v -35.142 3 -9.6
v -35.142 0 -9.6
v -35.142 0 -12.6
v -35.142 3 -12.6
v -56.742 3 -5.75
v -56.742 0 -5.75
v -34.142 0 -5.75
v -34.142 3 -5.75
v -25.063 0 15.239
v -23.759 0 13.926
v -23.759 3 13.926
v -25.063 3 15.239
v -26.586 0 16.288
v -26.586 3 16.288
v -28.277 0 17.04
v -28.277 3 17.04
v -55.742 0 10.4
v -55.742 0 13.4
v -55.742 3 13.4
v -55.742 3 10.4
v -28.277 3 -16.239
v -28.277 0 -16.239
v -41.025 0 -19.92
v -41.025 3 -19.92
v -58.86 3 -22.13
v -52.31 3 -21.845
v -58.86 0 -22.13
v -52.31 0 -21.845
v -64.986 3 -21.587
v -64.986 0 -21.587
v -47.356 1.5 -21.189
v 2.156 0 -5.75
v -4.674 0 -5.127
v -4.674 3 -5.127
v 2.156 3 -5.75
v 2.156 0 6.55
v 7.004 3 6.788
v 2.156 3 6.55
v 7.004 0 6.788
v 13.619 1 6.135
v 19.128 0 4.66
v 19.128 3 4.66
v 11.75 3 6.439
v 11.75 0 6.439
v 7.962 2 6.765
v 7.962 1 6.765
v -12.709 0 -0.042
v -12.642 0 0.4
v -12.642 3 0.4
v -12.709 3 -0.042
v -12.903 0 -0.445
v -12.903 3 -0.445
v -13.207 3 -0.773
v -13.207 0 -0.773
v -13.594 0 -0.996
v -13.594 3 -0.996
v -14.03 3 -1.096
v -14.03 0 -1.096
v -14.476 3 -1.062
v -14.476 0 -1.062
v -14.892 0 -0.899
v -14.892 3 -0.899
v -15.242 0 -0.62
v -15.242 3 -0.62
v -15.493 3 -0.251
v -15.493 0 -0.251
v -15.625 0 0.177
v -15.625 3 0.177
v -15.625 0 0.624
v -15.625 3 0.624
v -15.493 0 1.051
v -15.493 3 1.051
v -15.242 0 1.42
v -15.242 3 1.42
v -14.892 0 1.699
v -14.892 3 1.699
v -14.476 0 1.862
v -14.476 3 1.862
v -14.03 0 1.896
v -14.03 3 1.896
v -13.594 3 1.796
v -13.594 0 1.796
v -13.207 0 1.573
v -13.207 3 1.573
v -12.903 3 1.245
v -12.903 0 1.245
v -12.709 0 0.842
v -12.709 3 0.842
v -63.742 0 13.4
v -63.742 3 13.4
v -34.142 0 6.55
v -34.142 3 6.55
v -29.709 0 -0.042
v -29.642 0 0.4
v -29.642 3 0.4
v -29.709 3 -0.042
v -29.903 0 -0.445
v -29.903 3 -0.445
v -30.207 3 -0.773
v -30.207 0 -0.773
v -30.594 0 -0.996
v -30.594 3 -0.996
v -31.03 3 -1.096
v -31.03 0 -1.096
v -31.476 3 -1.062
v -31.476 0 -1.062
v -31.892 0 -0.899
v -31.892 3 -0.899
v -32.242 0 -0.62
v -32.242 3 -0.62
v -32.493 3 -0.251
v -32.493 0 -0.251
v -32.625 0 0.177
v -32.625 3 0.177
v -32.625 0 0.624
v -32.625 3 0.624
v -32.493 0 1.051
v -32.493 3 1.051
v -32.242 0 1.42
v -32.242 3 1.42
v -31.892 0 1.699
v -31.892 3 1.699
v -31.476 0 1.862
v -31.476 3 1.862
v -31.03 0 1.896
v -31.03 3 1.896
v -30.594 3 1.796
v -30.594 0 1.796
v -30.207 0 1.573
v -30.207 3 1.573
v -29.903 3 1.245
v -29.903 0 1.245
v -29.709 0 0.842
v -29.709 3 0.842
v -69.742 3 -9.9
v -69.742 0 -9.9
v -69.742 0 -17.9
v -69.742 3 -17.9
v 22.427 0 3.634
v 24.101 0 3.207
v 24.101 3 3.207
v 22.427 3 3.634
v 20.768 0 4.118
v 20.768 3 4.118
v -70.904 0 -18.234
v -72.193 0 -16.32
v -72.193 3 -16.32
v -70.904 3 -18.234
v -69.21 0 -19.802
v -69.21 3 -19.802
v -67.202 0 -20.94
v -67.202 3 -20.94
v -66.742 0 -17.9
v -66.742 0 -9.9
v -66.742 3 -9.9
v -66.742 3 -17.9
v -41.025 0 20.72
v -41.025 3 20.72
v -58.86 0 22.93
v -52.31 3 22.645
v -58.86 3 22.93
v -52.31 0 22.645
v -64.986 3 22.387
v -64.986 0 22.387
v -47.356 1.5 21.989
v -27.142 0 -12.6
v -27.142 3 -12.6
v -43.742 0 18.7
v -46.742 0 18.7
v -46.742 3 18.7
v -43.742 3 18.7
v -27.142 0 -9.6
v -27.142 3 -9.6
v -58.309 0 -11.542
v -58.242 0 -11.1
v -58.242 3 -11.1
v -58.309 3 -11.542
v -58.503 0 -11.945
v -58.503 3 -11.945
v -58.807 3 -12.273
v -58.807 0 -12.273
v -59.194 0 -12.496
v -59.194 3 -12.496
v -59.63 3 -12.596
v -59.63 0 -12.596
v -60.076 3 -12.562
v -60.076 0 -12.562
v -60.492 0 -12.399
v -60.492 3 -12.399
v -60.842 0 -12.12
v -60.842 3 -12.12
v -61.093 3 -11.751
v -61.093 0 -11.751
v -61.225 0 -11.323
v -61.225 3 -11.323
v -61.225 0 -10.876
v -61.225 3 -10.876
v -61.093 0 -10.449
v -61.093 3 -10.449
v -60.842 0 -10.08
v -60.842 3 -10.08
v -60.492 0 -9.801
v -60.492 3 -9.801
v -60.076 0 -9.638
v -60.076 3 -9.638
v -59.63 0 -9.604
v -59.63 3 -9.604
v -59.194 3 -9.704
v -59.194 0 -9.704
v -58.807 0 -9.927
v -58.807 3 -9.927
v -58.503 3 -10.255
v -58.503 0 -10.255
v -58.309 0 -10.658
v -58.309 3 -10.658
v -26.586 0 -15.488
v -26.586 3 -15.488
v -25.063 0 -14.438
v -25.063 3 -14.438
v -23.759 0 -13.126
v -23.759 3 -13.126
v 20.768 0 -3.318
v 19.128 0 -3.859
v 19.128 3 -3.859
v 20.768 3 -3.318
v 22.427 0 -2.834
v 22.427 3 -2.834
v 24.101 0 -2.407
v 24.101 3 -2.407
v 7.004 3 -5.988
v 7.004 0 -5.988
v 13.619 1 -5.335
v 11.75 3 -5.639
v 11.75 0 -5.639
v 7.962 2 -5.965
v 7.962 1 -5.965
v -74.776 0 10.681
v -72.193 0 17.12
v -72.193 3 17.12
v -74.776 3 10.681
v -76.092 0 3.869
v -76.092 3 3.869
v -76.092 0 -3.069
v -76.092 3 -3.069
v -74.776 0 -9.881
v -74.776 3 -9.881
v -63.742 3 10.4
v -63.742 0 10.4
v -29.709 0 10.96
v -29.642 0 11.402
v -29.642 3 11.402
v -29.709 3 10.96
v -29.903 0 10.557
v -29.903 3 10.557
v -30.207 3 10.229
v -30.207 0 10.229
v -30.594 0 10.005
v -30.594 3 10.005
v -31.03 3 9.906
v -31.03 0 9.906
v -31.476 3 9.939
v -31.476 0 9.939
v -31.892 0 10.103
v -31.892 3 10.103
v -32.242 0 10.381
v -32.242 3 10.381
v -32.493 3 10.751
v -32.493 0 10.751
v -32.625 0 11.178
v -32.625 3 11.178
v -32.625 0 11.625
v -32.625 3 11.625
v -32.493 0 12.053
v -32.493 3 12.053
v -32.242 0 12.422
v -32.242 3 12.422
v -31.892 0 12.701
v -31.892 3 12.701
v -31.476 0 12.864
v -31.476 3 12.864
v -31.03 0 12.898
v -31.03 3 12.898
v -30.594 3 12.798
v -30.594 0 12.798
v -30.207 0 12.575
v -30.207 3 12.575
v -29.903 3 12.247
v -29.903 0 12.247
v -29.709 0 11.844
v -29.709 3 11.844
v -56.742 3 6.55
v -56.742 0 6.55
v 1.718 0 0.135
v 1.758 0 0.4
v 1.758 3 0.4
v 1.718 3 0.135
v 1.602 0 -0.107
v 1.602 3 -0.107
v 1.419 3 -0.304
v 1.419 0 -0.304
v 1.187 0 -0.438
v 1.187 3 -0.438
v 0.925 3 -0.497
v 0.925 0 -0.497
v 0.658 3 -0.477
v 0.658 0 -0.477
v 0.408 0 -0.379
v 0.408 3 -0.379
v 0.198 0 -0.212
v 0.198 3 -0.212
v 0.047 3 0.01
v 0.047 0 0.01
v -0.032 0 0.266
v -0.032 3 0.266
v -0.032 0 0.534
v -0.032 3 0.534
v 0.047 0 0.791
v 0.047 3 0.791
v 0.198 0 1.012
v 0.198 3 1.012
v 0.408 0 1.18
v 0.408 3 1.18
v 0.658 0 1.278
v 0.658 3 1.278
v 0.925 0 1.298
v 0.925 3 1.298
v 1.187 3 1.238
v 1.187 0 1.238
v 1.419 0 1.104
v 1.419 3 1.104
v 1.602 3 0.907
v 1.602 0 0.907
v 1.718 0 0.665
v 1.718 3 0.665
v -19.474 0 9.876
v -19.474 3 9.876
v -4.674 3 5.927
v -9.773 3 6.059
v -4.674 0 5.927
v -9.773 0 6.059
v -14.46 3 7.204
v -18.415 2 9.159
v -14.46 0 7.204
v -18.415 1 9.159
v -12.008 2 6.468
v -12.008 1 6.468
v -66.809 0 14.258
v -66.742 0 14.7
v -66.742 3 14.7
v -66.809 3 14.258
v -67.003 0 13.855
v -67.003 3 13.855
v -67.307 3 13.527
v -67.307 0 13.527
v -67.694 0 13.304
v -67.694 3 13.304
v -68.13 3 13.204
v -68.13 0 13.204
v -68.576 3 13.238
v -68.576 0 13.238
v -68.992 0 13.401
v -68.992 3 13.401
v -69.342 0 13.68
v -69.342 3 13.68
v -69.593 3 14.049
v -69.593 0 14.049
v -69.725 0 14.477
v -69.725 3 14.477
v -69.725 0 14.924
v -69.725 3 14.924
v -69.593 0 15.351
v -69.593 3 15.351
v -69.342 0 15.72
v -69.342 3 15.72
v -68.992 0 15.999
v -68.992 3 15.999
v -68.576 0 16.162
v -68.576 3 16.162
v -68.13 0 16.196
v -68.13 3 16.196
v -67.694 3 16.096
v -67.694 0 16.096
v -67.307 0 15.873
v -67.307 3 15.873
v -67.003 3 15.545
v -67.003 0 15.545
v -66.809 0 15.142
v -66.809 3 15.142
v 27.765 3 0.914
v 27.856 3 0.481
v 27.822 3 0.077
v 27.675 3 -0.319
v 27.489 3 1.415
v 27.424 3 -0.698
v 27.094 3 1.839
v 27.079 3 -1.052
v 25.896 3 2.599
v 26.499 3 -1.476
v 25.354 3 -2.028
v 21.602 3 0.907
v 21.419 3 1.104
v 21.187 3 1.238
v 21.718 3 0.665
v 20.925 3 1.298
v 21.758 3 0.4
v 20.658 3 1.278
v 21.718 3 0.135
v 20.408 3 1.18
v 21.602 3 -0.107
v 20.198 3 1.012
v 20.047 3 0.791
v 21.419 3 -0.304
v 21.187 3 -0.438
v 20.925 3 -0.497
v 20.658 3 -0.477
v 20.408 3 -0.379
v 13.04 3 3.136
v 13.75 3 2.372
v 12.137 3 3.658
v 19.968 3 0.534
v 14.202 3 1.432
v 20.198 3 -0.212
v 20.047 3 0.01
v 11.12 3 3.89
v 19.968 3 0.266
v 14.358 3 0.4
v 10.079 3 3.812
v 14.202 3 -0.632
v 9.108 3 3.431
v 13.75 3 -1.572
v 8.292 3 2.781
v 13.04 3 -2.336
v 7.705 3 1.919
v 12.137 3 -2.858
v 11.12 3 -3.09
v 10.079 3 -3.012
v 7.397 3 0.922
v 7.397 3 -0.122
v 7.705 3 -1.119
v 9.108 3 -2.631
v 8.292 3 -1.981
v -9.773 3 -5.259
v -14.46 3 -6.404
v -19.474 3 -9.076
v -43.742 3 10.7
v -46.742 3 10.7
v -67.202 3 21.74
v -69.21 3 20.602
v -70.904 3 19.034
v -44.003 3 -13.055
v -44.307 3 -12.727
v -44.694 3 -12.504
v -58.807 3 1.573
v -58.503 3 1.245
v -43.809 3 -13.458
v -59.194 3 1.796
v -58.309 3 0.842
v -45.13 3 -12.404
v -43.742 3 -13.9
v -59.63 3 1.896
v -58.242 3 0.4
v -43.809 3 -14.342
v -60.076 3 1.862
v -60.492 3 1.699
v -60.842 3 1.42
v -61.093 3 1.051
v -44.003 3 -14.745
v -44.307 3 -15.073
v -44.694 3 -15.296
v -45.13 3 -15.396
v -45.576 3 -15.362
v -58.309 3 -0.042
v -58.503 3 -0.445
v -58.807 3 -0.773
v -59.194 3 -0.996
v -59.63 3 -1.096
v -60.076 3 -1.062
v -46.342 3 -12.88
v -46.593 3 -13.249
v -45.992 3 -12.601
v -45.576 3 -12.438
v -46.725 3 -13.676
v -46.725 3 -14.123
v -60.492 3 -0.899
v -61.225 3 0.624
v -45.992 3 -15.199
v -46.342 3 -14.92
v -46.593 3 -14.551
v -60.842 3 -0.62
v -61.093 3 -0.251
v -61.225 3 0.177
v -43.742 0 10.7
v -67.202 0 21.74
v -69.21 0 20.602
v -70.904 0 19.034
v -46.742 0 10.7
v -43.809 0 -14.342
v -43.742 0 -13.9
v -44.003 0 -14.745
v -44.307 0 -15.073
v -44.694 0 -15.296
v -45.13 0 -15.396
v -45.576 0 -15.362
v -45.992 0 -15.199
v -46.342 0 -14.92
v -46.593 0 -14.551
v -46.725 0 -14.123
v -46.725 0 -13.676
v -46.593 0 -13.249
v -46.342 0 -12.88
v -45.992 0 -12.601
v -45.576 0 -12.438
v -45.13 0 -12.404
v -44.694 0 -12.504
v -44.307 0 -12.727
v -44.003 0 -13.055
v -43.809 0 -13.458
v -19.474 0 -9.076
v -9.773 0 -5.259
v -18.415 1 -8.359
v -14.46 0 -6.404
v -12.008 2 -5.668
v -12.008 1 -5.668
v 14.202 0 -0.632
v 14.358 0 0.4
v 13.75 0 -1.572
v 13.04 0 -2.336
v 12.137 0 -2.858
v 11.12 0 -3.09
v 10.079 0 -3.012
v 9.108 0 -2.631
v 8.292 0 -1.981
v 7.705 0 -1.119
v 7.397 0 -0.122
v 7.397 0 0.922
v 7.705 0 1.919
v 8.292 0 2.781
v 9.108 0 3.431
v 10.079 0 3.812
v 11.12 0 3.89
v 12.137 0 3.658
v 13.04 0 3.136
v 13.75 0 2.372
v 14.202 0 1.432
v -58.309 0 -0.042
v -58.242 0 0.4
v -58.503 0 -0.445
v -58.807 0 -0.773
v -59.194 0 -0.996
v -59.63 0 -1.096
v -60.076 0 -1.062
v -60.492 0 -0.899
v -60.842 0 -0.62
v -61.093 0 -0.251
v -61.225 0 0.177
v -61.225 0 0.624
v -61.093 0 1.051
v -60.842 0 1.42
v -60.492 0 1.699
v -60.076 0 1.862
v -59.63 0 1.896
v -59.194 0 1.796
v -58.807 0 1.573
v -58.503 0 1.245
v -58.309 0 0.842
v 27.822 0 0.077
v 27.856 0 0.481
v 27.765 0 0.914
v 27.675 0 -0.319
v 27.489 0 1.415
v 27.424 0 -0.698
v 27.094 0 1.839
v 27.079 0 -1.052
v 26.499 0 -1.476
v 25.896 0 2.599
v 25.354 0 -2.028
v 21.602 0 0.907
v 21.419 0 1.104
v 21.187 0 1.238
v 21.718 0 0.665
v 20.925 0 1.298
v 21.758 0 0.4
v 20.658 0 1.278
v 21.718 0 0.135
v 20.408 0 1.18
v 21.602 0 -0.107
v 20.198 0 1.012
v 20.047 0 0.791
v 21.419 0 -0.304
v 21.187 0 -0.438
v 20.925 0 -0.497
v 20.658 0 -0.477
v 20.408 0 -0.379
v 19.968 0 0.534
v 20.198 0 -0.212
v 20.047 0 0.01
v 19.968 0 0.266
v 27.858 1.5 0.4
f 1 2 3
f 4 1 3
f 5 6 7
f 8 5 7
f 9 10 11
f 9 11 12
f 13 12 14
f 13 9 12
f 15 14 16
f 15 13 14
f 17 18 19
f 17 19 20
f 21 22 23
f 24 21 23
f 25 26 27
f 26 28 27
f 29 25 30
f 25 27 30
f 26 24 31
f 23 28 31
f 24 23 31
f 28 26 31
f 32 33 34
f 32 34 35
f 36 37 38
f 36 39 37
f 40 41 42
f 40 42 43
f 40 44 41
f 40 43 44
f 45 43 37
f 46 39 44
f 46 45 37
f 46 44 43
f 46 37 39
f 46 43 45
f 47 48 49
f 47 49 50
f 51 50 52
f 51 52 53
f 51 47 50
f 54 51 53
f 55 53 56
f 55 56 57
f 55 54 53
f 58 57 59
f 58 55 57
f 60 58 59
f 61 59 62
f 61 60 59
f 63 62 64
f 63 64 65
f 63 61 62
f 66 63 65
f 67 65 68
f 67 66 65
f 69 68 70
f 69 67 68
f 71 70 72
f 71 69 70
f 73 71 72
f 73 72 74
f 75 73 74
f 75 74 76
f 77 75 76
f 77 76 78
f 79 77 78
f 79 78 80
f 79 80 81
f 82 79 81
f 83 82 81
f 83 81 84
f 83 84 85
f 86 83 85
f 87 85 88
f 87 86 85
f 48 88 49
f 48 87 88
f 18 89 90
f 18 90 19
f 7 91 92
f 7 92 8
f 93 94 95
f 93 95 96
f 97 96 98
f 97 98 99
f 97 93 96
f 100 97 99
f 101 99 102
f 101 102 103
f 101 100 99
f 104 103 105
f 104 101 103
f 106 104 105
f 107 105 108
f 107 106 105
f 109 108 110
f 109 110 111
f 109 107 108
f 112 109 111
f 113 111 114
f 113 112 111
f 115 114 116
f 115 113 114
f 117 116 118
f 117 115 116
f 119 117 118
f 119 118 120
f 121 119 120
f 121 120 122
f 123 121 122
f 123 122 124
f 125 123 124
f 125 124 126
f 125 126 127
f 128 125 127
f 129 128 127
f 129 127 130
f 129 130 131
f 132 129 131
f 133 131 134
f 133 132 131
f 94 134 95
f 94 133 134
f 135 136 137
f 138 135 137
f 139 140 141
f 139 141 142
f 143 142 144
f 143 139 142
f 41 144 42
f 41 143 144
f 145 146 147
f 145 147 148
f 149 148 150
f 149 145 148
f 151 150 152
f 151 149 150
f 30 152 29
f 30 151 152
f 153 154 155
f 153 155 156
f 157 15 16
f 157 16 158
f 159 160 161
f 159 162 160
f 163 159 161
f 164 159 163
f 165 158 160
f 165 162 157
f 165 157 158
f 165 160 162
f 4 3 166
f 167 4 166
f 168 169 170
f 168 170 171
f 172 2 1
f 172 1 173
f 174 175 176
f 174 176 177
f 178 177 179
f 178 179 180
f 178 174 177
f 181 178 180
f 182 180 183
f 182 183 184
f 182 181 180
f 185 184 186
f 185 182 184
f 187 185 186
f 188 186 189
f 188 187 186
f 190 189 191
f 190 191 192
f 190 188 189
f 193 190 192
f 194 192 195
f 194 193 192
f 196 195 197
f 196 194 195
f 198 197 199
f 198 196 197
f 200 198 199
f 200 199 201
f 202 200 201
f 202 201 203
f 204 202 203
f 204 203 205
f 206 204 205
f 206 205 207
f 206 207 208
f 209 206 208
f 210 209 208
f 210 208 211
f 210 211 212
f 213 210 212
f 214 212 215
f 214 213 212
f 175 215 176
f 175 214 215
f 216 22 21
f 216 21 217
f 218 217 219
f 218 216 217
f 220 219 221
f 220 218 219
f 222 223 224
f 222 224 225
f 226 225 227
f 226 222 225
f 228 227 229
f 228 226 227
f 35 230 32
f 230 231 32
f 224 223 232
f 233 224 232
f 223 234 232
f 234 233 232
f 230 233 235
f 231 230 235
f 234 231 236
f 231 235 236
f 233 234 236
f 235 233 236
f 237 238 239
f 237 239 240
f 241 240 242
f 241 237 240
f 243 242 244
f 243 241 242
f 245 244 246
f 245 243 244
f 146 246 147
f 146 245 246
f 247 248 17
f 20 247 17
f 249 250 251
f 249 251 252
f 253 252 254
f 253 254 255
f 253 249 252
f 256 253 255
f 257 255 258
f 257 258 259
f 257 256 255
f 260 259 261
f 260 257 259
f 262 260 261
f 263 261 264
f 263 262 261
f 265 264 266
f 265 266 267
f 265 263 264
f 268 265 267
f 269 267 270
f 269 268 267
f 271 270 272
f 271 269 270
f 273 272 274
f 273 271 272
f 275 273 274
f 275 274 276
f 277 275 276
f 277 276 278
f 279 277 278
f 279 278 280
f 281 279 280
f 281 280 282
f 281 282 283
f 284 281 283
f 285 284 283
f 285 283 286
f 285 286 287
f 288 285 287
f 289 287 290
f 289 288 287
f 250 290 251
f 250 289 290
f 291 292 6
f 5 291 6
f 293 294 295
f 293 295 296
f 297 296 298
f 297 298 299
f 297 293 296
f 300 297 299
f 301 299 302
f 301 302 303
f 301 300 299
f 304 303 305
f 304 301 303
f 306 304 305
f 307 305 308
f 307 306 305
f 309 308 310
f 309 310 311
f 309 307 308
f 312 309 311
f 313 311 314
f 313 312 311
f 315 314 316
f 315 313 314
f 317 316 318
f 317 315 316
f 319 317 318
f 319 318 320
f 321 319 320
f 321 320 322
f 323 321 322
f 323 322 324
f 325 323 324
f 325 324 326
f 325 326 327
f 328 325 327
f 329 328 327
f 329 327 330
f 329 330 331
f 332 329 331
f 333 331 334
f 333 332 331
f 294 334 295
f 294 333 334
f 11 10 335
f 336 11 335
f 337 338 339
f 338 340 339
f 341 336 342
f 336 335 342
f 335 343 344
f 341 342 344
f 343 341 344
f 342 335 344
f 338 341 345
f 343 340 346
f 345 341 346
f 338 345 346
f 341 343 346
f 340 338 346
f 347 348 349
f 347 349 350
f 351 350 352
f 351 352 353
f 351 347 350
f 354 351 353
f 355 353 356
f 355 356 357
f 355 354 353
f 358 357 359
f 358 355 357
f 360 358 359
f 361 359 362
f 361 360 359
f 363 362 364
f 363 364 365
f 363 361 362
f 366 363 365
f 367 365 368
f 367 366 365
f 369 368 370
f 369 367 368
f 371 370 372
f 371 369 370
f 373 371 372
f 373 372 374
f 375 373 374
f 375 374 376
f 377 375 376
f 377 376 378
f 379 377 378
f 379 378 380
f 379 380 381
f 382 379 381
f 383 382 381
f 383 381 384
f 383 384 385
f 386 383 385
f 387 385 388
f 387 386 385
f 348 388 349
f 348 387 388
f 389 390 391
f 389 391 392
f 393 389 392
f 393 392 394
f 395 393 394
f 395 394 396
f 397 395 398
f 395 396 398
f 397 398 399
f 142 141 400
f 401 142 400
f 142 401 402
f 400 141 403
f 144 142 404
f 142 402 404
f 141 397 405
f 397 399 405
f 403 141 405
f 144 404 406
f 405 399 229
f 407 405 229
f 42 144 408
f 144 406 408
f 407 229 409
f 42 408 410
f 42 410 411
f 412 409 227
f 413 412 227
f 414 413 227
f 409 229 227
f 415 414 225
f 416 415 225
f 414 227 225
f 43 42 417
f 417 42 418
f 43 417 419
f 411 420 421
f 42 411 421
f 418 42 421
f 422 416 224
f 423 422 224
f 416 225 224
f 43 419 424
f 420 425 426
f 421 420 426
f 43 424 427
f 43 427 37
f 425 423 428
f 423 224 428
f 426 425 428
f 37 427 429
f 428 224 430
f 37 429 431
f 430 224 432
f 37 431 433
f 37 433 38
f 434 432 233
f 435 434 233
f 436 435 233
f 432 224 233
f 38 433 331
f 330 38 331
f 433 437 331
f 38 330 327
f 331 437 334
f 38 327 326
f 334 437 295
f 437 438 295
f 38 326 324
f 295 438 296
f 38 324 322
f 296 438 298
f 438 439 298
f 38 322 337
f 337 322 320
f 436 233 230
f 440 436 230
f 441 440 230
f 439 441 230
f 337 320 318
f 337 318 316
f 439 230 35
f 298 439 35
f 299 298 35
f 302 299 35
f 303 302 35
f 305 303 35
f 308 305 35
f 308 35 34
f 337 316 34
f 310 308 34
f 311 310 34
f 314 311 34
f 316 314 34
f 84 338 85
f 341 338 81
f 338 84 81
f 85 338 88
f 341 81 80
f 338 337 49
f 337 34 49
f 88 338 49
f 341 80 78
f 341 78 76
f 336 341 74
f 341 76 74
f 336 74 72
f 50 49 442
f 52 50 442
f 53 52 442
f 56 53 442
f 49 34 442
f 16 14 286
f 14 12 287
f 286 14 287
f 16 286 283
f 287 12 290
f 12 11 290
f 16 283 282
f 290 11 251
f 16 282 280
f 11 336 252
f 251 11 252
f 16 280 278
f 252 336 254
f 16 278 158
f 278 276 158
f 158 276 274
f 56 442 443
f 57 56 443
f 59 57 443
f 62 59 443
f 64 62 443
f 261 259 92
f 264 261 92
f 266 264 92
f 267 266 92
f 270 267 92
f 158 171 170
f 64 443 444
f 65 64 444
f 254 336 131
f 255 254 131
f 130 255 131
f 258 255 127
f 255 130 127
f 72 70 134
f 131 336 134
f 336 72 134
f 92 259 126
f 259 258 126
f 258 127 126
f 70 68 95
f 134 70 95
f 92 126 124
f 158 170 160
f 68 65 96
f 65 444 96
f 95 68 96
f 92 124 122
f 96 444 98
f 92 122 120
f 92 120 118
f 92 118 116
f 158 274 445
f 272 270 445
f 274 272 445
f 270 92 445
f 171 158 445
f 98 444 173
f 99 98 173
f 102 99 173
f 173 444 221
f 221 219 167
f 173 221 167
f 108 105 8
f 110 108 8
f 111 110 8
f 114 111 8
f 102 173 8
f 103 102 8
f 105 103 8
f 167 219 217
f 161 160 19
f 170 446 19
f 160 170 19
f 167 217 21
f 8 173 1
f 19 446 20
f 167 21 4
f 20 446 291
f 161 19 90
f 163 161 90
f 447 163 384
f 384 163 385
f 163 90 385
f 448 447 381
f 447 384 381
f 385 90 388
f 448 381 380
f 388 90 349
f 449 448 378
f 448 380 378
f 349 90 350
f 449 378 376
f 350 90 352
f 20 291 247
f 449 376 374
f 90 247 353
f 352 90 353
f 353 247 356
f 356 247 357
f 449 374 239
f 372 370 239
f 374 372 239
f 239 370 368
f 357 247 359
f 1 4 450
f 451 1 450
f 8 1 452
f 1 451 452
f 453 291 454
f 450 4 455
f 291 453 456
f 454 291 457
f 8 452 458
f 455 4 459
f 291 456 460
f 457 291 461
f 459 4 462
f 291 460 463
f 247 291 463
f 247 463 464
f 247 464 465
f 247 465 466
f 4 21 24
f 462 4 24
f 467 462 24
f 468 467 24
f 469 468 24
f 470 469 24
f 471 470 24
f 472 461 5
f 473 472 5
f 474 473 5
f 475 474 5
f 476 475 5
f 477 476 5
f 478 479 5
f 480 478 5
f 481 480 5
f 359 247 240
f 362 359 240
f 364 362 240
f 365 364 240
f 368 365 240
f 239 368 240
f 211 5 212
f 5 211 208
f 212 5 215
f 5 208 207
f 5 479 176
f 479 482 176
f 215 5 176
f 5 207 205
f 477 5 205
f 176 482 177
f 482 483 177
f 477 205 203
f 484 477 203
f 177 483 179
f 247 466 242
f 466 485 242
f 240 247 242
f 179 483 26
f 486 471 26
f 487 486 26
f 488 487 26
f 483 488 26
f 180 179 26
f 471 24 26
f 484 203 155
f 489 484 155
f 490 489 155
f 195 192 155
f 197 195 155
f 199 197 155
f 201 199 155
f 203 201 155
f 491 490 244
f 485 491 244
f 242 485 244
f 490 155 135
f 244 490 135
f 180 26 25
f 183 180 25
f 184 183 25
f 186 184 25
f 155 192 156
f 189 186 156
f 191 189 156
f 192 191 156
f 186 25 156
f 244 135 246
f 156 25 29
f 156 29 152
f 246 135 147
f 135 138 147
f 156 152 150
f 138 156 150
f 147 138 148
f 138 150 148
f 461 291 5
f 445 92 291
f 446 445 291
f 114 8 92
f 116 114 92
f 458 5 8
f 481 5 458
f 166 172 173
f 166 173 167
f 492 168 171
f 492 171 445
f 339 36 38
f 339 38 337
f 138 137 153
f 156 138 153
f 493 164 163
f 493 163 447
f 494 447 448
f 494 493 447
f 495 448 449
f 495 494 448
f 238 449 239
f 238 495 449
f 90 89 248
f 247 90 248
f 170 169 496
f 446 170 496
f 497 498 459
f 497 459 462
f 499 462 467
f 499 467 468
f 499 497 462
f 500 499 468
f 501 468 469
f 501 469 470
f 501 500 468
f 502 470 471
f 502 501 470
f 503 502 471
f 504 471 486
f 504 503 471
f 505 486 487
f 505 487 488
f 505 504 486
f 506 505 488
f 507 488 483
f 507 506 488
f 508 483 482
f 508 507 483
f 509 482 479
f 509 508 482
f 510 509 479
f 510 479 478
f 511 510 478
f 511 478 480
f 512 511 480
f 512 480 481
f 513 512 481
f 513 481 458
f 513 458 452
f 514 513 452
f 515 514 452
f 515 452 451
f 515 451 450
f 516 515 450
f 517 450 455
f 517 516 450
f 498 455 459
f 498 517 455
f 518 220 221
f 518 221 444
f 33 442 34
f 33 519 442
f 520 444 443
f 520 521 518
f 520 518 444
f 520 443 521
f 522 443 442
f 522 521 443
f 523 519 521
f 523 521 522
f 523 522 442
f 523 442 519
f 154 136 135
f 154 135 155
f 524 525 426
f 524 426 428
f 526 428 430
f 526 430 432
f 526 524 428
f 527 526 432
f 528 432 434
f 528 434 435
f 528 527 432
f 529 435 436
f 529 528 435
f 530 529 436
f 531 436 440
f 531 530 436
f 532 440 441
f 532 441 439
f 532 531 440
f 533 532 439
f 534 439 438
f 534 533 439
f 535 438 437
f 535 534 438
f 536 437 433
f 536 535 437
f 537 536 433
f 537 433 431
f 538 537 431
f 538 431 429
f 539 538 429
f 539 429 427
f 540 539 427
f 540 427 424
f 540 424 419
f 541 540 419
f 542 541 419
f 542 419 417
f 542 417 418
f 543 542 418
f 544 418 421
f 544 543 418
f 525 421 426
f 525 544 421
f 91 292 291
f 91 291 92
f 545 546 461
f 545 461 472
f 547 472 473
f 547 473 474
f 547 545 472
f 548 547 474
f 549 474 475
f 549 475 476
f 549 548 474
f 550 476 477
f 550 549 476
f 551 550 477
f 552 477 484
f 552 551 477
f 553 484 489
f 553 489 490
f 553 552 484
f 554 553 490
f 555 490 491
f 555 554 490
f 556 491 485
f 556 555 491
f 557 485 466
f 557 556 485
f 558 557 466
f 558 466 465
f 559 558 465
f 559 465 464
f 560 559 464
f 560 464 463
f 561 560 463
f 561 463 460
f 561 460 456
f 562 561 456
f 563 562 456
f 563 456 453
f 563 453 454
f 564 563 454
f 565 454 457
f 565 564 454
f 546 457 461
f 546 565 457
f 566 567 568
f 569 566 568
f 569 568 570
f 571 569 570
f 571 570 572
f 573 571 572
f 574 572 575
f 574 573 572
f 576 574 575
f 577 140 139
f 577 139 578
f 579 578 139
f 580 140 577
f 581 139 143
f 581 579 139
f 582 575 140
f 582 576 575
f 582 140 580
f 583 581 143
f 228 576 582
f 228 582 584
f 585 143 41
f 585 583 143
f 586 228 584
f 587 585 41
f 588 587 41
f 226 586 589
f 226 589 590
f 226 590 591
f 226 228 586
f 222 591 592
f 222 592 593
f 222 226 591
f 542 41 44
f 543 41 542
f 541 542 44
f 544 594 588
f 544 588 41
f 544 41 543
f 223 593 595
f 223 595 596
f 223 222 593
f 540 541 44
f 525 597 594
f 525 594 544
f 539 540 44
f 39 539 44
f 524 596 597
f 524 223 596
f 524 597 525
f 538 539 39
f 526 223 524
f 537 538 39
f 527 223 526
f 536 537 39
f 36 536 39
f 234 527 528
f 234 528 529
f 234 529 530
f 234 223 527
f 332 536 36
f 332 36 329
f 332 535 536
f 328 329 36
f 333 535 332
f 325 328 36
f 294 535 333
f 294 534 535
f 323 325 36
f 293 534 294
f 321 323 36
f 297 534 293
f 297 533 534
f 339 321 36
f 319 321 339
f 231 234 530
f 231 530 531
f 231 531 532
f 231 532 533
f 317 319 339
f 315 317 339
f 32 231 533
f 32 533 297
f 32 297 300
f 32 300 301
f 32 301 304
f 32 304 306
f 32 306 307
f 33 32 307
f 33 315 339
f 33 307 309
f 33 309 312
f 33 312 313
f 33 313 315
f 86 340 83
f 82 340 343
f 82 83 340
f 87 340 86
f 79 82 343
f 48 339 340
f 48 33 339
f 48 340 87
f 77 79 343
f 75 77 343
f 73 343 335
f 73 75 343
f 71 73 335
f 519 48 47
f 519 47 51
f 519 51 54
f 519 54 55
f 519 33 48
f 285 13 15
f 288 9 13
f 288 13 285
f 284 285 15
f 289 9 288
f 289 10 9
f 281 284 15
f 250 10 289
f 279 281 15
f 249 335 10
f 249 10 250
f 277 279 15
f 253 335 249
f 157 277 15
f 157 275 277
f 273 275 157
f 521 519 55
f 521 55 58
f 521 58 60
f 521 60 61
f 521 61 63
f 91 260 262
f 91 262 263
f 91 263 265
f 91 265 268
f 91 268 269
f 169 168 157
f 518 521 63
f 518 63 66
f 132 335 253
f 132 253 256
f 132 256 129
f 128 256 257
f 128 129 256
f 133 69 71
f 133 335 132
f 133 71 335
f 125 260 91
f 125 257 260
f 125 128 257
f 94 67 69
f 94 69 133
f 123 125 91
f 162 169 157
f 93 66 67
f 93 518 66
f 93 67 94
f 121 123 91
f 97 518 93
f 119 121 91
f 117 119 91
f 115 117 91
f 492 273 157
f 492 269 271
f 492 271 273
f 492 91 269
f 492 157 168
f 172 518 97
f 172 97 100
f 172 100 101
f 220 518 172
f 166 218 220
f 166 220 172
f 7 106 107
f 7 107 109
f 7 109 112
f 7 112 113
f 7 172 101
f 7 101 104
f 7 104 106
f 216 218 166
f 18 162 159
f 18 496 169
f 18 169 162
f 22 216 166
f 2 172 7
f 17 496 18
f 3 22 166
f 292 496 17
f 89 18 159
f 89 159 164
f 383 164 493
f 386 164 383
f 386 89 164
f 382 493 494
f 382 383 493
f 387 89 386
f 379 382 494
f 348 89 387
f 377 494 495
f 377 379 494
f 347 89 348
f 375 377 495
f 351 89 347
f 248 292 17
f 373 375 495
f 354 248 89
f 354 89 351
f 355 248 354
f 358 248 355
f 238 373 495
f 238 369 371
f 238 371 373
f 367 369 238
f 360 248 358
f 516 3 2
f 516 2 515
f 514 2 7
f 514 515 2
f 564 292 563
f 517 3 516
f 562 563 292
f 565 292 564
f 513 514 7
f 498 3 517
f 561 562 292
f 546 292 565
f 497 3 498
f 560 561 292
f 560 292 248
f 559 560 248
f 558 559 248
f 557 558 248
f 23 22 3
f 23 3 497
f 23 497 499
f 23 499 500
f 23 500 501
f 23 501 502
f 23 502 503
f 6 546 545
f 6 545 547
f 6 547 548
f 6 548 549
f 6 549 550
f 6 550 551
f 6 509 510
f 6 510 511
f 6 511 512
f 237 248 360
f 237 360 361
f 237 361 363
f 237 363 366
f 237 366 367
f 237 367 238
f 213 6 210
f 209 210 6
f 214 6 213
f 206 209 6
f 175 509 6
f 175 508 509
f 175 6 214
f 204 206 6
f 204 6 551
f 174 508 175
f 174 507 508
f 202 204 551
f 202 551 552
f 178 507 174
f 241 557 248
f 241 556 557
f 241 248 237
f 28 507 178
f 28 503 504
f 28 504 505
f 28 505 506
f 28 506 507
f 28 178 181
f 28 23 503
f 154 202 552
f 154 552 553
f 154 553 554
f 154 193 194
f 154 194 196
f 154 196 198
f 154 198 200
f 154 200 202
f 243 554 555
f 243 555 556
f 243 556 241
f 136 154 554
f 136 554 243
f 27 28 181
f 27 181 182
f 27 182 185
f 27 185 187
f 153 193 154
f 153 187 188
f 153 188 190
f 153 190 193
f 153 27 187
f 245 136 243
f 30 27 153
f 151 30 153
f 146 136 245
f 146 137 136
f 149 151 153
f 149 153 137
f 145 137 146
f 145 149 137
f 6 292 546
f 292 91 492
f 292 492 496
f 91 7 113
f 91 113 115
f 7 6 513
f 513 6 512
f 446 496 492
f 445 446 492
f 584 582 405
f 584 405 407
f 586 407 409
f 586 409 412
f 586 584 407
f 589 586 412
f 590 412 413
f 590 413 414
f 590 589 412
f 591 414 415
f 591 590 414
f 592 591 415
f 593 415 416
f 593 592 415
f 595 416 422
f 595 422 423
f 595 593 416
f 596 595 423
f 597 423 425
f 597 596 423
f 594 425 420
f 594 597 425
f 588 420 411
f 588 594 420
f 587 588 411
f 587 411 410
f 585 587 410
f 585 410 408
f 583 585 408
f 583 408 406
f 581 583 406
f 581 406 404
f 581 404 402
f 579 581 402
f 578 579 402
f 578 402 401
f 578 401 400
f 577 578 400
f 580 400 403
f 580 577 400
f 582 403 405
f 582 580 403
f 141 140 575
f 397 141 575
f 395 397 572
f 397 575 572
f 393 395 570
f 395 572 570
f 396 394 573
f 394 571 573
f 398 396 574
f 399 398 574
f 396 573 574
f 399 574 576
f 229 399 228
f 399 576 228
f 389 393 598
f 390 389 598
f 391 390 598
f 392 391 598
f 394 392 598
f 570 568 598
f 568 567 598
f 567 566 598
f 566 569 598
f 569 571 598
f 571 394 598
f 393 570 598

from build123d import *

# Parameters (mm, degrees)
ESBO_O1_R                = 1.5
ESBO_O1_R_2              = 3.5
ESBO_O1_R_3              = 0.9
ESBO_O1_W                = 22.6
ESBO_O1_H                = 12.3
ESBO_O1_W_2              = 3
ESBO_O1_H_2              = 8
ESBO_O1_W_3              = 8
ESBO_O1_H_3              = 3
RESSALTO_EXTRUS_O1_DEPTH = 3


with BuildPart() as part:
    # Esboço1 → Ressalto-extrusão1 (new body)
    with BuildSketch(Plane(origin=(0, 0, 0), x_dir=(1, 0, 0), z_dir=(0, 1, 0))):
        with BuildLine():
            Line((-4.674449837, 5.126823449), (2.15649844, 5.74992269))
            add(Edge.make_bspline(
                [(19.127700004, 3.859391667), (13.692888976, 5.757269931), (8.035822873, 6.387450044), (2.15649844, 5.74992269)],
                knots=[0.35388944, 0.35388944, 0.35388944, 0.35388944, 1, 1, 1, 1], degree=3))
            ThreePointArc((19.127700004, 3.859391667), (21.595587829, 3.06871935), (24.101127023, 2.406974398))
            add(Edge.make_bspline(
                [(24.101129521, -3.20712694), (35.966754752, -0.40007519), (24.101127023, 2.406974398)],
                knots=[5.194112275, 5.194112275, 5.194112275, 7.372258742, 7.372258742, 7.372258742], degree=2, weights=[1, 0.463306864, 1]))
            ThreePointArc((24.101129521, -3.20712694), (21.595589041, -3.868872862), (19.127700004, -4.659546287))
            add(Edge.make_bspline(
                [(19.127700004, -4.659546287), (13.692889505, -6.55742607), (8.035822337, -7.187603127), (2.15649844, -6.55007731)],
                knots=[0.35388944, 0.35388944, 0.35388944, 0.35388944, 1, 1, 1, 1], degree=3))
            Line((2.15649844, -6.55007731), (-4.674449837, -5.926978069))
            add(Edge.make_bspline(
                [(-23.759026807, -13.92609603), (-18.993134449, -8.145749128), (-12.424143506, -5.367564321), (-4.674449837, -5.926978069)],
                knots=[0.101821695, 0.101821695, 0.101821695, 0.101821695, 1, 1, 1, 1], degree=3))
            ThreePointArc((-23.759026807, -13.92609603), (-25.800414194, -15.798822034), (-28.277263571, -17.039621097))
            add(Edge.make_bspline(
                [(-28.277263571, -17.039621097), (-34.579205058, -19.166234), (-47.597806191, -22.747709276), (-59.650258973, -23.294853785), (-64.986052109, -22.387135922)],
                knots=[0.241589655, 0.241589655, 0.241589655, 0.241589655, 0.401358205, 0.561126756, 0.561126756, 0.561126756, 0.561126756], degree=3))
            ThreePointArc((-64.986052109, -22.387135922), (-69.209775007, -20.602207926), (-72.192804257, -17.119774932))
            ThreePointArc((-72.192804257, -17.119774932), (-76.257665323, -0.40007754), (-72.192804468, 16.319619904))
            ThreePointArc((-72.192804468, 16.319619904), (-69.209774999, 19.802053128), (-64.986051746, 21.586981094))
            add(Edge.make_bspline(
                [(-28.2772637, 16.239466453), (-34.57920511, 18.366079177), (-47.597806077, 21.947554059), (-59.650258689, 22.494698656), (-64.986051746, 21.586981094)],
                knots=[0.241589656, 0.241589656, 0.241589656, 0.241589656, 0.401358204, 0.561126752, 0.561126752, 0.561126752, 0.561126752], degree=3))
            ThreePointArc((-28.2772637, 16.239466453), (-25.80041422, 14.998667392), (-23.759026751, 13.125941342))
            add(Edge.make_bspline(
                [(-23.759026751, 13.125941342), (-18.993134399, 7.345594488), (-12.424143468, 4.567409699), (-4.674449837, 5.126823449)],
                knots=[0.101821698, 0.101821698, 0.101821698, 0.101821698, 1, 1, 1, 1], degree=3))
        make_face()
        with Locations((-59.742023738, -0.40007731)):
            Circle(ESBO_O1_R, mode=Mode.SUBTRACT)
        with Locations((-31.142023738, -0.40007731)):
            Circle(ESBO_O1_R, mode=Mode.SUBTRACT)
        with Locations((-45.242023738, 13.89992269)):
            Circle(ESBO_O1_R, mode=Mode.SUBTRACT)
        with Locations((-68.242023738, -14.70007731)):
            Circle(ESBO_O1_R, mode=Mode.SUBTRACT)
        with Locations((-59.742023738, 11.09992269)):
            Circle(ESBO_O1_R, mode=Mode.SUBTRACT)
        with Locations((-31.142023738, -11.40175485)):
            Circle(ESBO_O1_R, mode=Mode.SUBTRACT)
        with Locations((10.857976262, -0.40007731)):
            Circle(ESBO_O1_R_2, mode=Mode.SUBTRACT)
        with Locations((20.857976262, -0.40007731)):
            Circle(ESBO_O1_R_3, mode=Mode.SUBTRACT)
        with Locations((0.857976262, -0.40007731)):
            Circle(ESBO_O1_R_3, mode=Mode.SUBTRACT)
        with Locations((-14.142023738, -0.40007731)):
            Circle(ESBO_O1_R, mode=Mode.SUBTRACT)
        with Locations((-45.442023738, -0.40007731)):
            Rectangle(ESBO_O1_W, ESBO_O1_H, mode=Mode.SUBTRACT)
        with Locations((-45.242023738, -14.70007731)):
            Rectangle(ESBO_O1_W_2, ESBO_O1_H_2, mode=Mode.SUBTRACT)
        with Locations((-68.242023738, 13.89992269)):
            Rectangle(ESBO_O1_W_2, ESBO_O1_H_2, mode=Mode.SUBTRACT)
        with Locations((-31.142023738, 11.099922699)):
            Rectangle(ESBO_O1_W_3, ESBO_O1_H_3, mode=Mode.SUBTRACT)
        with Locations((-59.742023738, -11.90007731)):
            Rectangle(ESBO_O1_W_3, ESBO_O1_H_3, mode=Mode.SUBTRACT)
    extrude(amount=RESSALTO_EXTRUS_O1_DEPTH)


solid = part.part
